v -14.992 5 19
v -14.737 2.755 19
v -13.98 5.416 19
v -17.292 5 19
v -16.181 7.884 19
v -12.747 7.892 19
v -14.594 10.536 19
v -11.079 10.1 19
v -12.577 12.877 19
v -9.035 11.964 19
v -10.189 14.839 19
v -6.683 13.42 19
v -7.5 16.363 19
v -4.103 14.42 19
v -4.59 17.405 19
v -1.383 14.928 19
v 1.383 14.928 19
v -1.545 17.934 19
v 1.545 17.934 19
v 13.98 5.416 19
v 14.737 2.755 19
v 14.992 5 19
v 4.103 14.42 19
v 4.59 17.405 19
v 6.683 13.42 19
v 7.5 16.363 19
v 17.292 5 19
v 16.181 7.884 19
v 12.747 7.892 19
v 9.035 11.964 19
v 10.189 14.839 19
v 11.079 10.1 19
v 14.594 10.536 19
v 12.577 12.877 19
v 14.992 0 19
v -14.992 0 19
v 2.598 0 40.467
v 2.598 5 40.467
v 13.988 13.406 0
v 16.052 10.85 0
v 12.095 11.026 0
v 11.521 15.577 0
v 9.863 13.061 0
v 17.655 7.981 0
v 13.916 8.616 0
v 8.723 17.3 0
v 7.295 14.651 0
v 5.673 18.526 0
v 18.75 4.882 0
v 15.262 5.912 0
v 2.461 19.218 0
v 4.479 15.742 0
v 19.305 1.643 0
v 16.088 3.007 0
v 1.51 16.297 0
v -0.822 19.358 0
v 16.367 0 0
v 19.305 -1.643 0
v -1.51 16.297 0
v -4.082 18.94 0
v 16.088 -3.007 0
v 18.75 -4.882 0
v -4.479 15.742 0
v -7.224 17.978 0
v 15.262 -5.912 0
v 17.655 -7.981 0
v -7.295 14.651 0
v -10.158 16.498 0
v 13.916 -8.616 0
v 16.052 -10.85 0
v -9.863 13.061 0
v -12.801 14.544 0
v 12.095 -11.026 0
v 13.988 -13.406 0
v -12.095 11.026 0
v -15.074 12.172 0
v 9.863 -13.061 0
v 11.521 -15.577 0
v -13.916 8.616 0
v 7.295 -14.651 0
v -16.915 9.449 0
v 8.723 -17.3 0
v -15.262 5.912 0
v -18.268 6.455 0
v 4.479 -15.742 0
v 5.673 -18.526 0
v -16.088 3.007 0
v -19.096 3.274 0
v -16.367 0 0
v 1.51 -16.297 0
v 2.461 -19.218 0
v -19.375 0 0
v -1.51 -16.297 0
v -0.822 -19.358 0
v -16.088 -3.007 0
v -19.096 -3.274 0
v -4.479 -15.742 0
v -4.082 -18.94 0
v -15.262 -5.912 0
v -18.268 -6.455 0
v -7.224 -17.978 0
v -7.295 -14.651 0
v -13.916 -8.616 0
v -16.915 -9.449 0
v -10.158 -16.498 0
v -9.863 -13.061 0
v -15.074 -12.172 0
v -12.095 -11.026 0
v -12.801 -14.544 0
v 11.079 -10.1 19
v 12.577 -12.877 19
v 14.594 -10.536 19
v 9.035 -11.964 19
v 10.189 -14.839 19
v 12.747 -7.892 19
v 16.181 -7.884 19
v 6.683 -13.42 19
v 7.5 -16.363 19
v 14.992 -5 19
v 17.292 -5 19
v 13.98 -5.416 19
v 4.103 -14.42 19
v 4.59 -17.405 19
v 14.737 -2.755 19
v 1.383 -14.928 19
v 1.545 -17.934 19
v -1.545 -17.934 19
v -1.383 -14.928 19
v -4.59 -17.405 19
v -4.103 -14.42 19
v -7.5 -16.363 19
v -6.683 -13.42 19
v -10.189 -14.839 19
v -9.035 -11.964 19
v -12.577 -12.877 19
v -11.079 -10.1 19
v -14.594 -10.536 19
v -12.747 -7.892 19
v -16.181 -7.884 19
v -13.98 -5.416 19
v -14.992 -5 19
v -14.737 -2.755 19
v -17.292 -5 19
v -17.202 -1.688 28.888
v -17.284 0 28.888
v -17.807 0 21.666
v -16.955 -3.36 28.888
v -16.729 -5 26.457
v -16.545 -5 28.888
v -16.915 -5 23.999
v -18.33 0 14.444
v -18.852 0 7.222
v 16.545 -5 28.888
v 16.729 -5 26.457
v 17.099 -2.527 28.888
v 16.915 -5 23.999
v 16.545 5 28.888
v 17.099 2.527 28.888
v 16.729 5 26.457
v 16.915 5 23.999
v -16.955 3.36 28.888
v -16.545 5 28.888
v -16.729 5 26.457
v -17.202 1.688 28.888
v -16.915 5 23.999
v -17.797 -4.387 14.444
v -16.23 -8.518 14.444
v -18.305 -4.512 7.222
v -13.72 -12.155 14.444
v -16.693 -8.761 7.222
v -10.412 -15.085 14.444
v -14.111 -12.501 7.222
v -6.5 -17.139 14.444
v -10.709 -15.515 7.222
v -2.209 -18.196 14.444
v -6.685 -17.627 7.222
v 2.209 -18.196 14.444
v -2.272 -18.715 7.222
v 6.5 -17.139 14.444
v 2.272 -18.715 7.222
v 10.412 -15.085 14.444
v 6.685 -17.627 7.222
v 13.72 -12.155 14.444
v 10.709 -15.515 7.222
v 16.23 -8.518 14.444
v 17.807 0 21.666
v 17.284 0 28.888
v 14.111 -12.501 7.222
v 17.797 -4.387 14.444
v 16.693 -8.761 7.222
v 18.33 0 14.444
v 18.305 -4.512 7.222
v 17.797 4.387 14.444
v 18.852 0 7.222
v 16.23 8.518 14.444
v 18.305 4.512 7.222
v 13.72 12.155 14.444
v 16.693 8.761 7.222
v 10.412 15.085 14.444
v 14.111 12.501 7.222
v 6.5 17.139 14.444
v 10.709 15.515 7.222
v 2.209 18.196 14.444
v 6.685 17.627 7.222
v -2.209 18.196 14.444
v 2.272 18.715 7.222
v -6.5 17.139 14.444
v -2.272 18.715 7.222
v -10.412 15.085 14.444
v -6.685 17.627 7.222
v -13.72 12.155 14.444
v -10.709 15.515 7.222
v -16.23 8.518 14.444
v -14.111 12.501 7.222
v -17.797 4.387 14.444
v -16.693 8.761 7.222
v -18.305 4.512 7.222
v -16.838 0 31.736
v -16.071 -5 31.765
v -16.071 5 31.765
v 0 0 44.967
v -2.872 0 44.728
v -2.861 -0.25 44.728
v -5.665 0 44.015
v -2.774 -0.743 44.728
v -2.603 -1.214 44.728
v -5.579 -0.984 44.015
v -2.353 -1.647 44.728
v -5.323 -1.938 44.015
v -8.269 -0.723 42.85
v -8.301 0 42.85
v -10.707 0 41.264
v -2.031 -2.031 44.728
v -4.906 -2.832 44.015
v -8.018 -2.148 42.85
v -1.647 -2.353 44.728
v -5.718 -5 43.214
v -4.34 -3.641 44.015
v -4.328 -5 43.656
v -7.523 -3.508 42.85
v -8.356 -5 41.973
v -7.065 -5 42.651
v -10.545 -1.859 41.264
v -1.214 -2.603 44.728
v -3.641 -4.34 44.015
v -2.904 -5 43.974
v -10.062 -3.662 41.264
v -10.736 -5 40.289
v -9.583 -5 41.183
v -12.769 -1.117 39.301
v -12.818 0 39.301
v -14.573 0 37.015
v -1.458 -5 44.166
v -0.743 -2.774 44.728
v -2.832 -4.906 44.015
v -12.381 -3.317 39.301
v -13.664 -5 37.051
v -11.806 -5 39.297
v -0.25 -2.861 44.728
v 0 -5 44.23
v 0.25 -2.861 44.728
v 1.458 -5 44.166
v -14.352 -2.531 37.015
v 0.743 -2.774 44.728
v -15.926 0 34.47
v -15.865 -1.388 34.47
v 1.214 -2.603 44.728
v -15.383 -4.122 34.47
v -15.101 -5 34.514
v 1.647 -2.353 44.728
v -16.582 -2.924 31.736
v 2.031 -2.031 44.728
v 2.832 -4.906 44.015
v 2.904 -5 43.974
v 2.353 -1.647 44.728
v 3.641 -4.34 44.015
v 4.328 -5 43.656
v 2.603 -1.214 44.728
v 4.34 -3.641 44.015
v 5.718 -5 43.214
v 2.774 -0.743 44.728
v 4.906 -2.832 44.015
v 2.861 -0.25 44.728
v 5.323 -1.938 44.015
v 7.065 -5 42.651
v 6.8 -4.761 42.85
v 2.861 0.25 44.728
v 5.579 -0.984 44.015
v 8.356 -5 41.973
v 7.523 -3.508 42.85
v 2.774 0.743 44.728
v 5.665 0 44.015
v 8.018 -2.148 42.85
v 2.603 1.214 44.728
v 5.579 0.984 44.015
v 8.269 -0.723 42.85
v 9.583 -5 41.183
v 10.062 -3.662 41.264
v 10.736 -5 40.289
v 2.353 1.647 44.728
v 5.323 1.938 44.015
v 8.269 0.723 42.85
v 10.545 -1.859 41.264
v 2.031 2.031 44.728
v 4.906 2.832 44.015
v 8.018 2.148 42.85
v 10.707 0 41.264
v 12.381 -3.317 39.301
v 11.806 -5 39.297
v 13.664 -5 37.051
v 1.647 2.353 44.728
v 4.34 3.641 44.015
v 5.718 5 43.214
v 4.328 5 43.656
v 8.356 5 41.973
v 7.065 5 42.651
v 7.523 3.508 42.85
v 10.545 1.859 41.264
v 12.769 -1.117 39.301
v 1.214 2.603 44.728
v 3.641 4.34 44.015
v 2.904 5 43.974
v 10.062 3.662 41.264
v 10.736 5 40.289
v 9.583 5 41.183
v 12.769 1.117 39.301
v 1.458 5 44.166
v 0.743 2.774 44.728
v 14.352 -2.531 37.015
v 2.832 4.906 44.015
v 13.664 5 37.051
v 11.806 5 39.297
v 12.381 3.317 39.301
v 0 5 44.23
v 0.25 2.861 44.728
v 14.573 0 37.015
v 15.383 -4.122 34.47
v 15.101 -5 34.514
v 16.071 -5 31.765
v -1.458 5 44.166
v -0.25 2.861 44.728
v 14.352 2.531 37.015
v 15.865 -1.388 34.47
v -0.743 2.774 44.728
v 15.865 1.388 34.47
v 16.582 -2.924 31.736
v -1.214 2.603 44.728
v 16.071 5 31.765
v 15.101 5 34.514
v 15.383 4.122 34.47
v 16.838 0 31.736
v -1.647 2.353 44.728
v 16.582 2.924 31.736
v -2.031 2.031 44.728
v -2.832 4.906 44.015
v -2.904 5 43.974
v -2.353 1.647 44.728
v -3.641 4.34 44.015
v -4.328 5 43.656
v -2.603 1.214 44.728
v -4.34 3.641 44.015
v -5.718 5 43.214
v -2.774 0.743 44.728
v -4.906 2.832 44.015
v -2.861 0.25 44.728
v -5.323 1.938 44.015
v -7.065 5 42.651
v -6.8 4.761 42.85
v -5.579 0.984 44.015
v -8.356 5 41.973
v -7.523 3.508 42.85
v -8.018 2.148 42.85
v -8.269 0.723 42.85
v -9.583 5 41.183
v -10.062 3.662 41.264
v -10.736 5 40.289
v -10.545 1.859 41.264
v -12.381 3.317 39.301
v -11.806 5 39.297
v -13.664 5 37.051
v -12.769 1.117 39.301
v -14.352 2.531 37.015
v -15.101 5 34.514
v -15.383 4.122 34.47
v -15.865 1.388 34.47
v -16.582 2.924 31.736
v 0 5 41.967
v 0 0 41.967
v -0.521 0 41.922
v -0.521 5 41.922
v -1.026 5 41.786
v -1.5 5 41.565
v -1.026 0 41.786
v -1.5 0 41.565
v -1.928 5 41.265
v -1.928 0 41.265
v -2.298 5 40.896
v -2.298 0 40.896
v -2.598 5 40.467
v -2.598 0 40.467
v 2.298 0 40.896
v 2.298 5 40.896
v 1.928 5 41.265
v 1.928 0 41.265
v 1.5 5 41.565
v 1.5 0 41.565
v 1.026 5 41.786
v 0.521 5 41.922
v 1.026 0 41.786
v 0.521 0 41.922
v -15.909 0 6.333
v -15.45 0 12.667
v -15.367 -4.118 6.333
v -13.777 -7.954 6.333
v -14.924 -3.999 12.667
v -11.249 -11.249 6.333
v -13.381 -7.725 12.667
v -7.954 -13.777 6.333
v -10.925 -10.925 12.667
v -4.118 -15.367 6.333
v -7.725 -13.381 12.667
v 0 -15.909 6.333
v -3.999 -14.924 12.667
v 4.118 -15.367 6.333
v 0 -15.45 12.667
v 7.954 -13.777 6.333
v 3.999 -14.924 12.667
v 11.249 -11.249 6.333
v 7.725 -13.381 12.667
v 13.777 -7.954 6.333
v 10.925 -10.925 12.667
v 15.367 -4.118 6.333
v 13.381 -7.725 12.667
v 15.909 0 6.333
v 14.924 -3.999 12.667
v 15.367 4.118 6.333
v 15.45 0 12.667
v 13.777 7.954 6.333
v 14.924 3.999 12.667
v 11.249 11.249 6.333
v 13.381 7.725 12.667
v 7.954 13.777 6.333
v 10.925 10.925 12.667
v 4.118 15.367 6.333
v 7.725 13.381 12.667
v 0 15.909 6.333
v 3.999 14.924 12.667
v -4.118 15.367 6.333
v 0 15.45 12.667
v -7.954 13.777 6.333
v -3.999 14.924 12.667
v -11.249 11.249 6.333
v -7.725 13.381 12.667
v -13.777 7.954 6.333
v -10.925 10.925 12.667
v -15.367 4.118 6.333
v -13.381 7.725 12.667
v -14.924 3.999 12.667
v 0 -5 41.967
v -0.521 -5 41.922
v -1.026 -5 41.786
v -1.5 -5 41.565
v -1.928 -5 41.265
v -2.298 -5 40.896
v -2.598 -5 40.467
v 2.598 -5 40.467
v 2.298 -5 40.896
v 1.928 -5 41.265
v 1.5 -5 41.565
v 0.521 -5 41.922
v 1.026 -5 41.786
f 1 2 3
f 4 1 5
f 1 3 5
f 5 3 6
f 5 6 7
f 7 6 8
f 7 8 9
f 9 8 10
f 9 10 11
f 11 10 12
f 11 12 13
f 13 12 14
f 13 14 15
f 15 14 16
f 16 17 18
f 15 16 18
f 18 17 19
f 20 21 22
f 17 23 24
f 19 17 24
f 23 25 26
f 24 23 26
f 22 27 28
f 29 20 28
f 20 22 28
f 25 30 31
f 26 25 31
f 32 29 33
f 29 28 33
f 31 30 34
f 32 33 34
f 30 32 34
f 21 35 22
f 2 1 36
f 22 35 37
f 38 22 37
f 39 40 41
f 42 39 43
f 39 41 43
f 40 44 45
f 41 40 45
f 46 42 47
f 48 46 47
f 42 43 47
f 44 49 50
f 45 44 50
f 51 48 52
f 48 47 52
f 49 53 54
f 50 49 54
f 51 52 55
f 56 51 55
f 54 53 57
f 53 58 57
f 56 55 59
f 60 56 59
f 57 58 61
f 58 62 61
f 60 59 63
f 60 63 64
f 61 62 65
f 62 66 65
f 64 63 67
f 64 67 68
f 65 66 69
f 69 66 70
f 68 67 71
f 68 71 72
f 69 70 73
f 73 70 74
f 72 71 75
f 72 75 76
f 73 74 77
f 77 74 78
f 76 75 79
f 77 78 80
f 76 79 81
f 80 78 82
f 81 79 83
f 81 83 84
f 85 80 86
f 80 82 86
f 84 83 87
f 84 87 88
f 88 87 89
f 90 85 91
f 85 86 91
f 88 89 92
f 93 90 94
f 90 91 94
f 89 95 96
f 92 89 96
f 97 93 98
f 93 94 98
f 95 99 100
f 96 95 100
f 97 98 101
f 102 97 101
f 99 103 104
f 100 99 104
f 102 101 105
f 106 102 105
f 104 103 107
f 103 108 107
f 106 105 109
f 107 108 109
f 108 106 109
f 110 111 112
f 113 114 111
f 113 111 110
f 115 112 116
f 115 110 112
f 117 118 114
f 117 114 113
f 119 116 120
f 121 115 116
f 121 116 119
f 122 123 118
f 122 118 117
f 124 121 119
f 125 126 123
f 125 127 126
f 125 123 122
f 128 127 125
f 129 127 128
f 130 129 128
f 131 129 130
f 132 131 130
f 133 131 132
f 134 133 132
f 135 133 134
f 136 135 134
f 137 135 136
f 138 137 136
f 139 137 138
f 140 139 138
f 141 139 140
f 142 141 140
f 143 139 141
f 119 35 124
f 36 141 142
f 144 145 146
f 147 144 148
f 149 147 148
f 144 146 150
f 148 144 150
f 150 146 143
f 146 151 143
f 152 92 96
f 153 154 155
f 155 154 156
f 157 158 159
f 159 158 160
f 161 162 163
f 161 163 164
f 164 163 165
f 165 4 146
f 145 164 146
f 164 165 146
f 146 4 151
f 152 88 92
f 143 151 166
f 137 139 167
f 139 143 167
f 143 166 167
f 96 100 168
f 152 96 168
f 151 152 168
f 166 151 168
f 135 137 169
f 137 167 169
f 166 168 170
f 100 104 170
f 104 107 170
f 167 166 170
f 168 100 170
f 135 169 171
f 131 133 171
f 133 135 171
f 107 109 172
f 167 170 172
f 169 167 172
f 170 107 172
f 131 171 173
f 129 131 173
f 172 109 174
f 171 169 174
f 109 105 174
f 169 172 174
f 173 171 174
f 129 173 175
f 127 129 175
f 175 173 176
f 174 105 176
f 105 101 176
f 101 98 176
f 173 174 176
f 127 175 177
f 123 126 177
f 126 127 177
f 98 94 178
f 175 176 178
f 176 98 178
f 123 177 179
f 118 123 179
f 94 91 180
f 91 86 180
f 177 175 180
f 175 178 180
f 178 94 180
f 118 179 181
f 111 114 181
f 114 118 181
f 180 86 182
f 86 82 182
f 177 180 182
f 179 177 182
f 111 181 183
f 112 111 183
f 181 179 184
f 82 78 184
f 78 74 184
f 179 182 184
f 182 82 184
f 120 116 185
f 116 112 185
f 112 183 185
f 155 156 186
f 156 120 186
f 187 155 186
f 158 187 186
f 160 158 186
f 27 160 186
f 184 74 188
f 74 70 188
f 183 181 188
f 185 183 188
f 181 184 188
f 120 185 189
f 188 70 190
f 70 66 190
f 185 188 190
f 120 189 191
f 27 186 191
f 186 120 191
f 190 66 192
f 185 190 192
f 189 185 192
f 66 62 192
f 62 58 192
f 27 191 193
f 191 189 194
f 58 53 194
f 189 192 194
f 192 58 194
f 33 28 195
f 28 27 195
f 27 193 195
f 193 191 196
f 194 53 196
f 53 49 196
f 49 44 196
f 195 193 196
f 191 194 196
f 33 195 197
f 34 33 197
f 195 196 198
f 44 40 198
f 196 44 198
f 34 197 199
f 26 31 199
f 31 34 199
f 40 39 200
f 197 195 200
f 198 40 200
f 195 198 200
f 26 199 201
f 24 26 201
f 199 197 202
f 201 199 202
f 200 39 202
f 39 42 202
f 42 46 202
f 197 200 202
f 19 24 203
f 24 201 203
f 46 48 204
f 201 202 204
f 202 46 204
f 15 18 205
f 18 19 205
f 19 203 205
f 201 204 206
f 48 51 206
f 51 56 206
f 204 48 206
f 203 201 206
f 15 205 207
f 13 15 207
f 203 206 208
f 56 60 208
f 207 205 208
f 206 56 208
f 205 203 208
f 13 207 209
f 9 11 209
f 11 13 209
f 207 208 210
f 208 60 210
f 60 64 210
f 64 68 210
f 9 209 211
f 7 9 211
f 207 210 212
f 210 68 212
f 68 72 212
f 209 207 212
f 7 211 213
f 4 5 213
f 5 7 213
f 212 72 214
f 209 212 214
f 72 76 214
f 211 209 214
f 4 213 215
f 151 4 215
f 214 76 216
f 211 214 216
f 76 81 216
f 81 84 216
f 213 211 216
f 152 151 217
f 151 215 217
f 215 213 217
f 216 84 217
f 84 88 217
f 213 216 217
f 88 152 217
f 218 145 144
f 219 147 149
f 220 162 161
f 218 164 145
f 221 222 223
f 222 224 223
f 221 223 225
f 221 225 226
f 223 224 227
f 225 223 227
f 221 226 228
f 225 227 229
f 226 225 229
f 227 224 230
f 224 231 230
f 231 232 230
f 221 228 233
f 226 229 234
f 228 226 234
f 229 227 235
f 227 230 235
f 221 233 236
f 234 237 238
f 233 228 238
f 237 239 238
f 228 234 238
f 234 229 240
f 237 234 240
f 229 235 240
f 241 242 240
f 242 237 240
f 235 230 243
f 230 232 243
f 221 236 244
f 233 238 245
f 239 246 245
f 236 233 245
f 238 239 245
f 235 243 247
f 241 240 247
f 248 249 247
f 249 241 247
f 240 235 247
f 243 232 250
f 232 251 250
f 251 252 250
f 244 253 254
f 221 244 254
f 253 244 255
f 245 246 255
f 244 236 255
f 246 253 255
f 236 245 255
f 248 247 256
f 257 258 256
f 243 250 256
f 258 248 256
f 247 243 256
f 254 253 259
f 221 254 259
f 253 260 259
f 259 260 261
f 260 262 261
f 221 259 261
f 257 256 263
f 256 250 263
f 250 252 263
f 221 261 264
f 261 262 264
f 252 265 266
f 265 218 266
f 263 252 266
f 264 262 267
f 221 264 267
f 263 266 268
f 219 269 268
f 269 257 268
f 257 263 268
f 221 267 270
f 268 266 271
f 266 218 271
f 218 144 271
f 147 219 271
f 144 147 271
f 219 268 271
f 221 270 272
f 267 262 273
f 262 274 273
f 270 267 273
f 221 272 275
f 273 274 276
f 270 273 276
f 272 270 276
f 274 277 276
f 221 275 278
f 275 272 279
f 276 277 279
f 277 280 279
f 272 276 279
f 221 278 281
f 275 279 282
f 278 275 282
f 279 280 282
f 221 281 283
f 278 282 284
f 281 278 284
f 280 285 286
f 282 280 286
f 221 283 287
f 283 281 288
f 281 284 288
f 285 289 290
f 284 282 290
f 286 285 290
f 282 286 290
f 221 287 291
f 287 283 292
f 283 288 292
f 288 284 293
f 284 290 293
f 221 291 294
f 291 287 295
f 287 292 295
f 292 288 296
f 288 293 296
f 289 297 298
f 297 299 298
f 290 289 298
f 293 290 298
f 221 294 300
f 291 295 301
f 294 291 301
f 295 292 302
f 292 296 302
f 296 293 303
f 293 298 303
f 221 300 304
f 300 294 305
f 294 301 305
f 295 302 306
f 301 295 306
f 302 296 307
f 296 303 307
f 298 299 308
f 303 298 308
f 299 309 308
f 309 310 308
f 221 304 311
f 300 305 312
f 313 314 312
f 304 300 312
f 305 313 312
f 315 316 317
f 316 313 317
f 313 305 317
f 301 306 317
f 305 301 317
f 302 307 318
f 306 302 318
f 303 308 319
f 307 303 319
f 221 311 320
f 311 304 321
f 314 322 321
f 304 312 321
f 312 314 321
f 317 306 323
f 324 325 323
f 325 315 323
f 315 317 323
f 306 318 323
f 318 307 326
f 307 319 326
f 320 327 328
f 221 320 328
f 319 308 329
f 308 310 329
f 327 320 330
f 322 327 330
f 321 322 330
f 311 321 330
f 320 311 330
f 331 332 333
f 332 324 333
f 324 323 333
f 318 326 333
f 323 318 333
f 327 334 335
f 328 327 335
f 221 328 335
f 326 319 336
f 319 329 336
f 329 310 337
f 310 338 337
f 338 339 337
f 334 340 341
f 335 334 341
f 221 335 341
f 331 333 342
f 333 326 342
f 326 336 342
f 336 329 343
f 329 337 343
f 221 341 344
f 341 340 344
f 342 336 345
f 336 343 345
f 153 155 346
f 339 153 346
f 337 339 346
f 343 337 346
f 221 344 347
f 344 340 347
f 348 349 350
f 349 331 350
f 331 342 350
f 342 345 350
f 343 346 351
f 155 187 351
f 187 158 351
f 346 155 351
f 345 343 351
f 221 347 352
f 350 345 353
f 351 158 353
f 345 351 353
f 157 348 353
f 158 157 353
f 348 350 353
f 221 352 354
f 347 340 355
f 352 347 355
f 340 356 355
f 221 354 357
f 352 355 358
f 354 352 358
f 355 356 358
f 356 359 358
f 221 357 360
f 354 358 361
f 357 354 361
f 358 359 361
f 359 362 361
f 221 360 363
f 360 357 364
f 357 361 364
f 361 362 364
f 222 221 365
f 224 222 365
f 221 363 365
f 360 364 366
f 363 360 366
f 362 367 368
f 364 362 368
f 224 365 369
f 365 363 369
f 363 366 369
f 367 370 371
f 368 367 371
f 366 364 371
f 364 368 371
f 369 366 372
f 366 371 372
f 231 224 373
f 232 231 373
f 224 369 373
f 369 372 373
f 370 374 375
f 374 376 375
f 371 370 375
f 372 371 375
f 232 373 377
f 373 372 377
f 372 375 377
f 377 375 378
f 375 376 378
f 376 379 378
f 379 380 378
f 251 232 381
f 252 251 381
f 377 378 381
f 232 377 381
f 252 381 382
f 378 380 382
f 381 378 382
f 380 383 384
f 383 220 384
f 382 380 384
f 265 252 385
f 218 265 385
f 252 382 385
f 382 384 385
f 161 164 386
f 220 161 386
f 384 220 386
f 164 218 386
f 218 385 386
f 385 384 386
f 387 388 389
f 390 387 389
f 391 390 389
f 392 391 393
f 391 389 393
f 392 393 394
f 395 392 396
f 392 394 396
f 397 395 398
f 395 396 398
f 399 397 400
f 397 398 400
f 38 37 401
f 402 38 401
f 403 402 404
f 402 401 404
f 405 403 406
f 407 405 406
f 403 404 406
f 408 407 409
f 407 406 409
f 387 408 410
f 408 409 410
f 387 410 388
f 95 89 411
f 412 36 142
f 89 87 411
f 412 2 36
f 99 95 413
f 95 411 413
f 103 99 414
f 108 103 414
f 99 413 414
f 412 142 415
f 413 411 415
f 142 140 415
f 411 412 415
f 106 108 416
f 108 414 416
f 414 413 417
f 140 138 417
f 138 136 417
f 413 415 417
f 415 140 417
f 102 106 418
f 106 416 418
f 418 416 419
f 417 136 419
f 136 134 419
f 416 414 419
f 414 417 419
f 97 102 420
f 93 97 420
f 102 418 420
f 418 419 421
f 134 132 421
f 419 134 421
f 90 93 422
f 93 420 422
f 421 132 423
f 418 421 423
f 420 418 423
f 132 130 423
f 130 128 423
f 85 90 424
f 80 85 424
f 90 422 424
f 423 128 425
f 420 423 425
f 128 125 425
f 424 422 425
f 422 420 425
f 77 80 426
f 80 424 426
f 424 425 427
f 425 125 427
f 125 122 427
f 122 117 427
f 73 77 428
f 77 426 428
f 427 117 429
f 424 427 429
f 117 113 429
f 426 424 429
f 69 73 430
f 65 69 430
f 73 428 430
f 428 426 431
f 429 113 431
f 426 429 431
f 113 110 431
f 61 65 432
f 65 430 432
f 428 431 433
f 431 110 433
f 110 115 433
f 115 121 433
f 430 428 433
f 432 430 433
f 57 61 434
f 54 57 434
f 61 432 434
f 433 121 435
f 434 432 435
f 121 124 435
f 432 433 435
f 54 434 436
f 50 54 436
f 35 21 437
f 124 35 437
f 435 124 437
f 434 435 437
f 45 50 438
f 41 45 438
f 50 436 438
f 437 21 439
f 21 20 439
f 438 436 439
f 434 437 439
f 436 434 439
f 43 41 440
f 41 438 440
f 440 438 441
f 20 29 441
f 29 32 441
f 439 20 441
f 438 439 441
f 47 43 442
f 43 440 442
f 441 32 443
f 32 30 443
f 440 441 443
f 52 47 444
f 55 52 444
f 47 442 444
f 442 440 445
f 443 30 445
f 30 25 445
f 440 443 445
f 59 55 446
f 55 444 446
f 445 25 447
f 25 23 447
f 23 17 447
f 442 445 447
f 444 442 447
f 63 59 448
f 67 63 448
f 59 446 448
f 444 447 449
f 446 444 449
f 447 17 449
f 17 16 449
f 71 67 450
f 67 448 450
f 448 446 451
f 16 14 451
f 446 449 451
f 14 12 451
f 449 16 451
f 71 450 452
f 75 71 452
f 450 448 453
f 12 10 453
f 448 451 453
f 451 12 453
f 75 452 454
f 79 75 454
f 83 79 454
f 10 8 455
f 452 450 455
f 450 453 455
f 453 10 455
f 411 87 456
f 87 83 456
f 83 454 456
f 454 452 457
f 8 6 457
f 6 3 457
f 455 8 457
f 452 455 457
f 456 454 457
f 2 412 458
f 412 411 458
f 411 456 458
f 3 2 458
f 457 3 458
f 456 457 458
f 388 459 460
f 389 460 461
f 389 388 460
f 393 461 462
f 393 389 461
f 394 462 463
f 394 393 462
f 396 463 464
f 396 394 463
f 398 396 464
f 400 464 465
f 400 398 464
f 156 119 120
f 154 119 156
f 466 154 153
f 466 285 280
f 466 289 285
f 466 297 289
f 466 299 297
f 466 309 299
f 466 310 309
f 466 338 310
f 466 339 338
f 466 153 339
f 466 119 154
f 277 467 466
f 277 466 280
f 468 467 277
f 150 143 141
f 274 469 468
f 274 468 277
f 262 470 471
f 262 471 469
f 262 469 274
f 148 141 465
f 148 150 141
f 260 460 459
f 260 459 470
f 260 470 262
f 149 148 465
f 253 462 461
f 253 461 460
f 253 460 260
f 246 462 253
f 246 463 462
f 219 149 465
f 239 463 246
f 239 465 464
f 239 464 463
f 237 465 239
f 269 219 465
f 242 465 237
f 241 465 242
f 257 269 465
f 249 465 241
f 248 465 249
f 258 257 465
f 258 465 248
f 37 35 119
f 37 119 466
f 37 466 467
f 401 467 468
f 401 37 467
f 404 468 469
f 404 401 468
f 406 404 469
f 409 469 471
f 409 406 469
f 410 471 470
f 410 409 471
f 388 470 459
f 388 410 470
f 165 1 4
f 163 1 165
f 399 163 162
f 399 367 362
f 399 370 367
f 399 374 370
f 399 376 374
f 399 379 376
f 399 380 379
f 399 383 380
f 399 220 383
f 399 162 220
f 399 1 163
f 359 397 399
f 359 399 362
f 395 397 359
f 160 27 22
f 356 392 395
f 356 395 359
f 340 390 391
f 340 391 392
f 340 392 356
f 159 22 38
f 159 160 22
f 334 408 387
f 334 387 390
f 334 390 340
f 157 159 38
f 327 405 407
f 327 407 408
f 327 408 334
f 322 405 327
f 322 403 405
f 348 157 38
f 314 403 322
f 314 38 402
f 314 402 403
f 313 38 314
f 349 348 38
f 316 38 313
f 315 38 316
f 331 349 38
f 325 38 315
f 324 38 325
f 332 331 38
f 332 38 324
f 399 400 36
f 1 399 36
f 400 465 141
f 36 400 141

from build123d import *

# Parameters (mm, degrees)
F2_W          = 40
F2_H          = 25.9671732676
F3_DEPTH      = 19.376
F3_DEPTH_BACK = 19.376
F4_DEPTH      = 19.376
F4_DEPTH_BACK = 19.376


with BuildPart() as f1:
    # F0 (on Front) → F1 (revolve)
    with BuildSketch(Plane.XZ):
        with BuildLine():
            Line((-18, 19), (-19.375, 0))
            Line((-19.375, 0), (-16.3671544762, 0))
            Line((-16.3671544762, 0), (-14.9921544762, 19))
            Line((-14.9921544762, 19), (-2.5980762114, 40.4671732676))
            ThreePointArc((-2.5980762114, 40.4671732676), (-1.5, 41.565249479), (0, 41.9671732676))
            Line((0, 41.9671732676), (0, 44.9671732676))
            ThreePointArc((0, 44.9671732676), (-11.8033499729, 40.3259888916), (-17.2843902722, 28.8884253296))
            Line((-17.2843902722, 28.8884253296), (-18, 19))
        make_face()
    revolve(axis=Axis((0, 0, 30.4835866338), (0, 0, 1)))

    # F2 (on Right) → F3 (cut, two sides)
    with BuildSketch(Plane.YZ) as f3_sk:
        with Locations((-25, 31.9835866338)):
            Rectangle(F2_W, F2_H)
        with Locations((25, 31.9835866338)):
            Rectangle(F2_W, F2_H)
    extrude(amount=F3_DEPTH, mode=Mode.SUBTRACT)
    extrude(f3_sk.sketch, amount=-F3_DEPTH_BACK, mode=Mode.SUBTRACT)

    # F0 (on Front) → F4 (cut, two sides)
    with BuildSketch(Plane.XZ) as f4_sk:
        with BuildLine():
            Line((-2.5980762114, 40.4671732676), (-14.9921544762, 19))
            Line((-14.9921544762, 19), (0, 19))
            Line((0, 19), (0, 41.9671732676))
            ThreePointArc((0, 41.9671732676), (-1.5, 41.565249479), (-2.5980762114, 40.4671732676))
        make_face()
        with BuildLine():
            Line((0, 41.9671732676), (0, 19))
            Line((0, 19), (14.9921544762, 19))
            Line((14.9921544762, 19), (2.5980762114, 40.4671732676))
            ThreePointArc((2.5980762114, 40.4671732676), (1.5, 41.565249479), (0, 41.9671732676))
        make_face()
    extrude(amount=-F4_DEPTH, mode=Mode.SUBTRACT)
    extrude(f4_sk.sketch, amount=F4_DEPTH_BACK, mode=Mode.SUBTRACT)


solid = f1.part
